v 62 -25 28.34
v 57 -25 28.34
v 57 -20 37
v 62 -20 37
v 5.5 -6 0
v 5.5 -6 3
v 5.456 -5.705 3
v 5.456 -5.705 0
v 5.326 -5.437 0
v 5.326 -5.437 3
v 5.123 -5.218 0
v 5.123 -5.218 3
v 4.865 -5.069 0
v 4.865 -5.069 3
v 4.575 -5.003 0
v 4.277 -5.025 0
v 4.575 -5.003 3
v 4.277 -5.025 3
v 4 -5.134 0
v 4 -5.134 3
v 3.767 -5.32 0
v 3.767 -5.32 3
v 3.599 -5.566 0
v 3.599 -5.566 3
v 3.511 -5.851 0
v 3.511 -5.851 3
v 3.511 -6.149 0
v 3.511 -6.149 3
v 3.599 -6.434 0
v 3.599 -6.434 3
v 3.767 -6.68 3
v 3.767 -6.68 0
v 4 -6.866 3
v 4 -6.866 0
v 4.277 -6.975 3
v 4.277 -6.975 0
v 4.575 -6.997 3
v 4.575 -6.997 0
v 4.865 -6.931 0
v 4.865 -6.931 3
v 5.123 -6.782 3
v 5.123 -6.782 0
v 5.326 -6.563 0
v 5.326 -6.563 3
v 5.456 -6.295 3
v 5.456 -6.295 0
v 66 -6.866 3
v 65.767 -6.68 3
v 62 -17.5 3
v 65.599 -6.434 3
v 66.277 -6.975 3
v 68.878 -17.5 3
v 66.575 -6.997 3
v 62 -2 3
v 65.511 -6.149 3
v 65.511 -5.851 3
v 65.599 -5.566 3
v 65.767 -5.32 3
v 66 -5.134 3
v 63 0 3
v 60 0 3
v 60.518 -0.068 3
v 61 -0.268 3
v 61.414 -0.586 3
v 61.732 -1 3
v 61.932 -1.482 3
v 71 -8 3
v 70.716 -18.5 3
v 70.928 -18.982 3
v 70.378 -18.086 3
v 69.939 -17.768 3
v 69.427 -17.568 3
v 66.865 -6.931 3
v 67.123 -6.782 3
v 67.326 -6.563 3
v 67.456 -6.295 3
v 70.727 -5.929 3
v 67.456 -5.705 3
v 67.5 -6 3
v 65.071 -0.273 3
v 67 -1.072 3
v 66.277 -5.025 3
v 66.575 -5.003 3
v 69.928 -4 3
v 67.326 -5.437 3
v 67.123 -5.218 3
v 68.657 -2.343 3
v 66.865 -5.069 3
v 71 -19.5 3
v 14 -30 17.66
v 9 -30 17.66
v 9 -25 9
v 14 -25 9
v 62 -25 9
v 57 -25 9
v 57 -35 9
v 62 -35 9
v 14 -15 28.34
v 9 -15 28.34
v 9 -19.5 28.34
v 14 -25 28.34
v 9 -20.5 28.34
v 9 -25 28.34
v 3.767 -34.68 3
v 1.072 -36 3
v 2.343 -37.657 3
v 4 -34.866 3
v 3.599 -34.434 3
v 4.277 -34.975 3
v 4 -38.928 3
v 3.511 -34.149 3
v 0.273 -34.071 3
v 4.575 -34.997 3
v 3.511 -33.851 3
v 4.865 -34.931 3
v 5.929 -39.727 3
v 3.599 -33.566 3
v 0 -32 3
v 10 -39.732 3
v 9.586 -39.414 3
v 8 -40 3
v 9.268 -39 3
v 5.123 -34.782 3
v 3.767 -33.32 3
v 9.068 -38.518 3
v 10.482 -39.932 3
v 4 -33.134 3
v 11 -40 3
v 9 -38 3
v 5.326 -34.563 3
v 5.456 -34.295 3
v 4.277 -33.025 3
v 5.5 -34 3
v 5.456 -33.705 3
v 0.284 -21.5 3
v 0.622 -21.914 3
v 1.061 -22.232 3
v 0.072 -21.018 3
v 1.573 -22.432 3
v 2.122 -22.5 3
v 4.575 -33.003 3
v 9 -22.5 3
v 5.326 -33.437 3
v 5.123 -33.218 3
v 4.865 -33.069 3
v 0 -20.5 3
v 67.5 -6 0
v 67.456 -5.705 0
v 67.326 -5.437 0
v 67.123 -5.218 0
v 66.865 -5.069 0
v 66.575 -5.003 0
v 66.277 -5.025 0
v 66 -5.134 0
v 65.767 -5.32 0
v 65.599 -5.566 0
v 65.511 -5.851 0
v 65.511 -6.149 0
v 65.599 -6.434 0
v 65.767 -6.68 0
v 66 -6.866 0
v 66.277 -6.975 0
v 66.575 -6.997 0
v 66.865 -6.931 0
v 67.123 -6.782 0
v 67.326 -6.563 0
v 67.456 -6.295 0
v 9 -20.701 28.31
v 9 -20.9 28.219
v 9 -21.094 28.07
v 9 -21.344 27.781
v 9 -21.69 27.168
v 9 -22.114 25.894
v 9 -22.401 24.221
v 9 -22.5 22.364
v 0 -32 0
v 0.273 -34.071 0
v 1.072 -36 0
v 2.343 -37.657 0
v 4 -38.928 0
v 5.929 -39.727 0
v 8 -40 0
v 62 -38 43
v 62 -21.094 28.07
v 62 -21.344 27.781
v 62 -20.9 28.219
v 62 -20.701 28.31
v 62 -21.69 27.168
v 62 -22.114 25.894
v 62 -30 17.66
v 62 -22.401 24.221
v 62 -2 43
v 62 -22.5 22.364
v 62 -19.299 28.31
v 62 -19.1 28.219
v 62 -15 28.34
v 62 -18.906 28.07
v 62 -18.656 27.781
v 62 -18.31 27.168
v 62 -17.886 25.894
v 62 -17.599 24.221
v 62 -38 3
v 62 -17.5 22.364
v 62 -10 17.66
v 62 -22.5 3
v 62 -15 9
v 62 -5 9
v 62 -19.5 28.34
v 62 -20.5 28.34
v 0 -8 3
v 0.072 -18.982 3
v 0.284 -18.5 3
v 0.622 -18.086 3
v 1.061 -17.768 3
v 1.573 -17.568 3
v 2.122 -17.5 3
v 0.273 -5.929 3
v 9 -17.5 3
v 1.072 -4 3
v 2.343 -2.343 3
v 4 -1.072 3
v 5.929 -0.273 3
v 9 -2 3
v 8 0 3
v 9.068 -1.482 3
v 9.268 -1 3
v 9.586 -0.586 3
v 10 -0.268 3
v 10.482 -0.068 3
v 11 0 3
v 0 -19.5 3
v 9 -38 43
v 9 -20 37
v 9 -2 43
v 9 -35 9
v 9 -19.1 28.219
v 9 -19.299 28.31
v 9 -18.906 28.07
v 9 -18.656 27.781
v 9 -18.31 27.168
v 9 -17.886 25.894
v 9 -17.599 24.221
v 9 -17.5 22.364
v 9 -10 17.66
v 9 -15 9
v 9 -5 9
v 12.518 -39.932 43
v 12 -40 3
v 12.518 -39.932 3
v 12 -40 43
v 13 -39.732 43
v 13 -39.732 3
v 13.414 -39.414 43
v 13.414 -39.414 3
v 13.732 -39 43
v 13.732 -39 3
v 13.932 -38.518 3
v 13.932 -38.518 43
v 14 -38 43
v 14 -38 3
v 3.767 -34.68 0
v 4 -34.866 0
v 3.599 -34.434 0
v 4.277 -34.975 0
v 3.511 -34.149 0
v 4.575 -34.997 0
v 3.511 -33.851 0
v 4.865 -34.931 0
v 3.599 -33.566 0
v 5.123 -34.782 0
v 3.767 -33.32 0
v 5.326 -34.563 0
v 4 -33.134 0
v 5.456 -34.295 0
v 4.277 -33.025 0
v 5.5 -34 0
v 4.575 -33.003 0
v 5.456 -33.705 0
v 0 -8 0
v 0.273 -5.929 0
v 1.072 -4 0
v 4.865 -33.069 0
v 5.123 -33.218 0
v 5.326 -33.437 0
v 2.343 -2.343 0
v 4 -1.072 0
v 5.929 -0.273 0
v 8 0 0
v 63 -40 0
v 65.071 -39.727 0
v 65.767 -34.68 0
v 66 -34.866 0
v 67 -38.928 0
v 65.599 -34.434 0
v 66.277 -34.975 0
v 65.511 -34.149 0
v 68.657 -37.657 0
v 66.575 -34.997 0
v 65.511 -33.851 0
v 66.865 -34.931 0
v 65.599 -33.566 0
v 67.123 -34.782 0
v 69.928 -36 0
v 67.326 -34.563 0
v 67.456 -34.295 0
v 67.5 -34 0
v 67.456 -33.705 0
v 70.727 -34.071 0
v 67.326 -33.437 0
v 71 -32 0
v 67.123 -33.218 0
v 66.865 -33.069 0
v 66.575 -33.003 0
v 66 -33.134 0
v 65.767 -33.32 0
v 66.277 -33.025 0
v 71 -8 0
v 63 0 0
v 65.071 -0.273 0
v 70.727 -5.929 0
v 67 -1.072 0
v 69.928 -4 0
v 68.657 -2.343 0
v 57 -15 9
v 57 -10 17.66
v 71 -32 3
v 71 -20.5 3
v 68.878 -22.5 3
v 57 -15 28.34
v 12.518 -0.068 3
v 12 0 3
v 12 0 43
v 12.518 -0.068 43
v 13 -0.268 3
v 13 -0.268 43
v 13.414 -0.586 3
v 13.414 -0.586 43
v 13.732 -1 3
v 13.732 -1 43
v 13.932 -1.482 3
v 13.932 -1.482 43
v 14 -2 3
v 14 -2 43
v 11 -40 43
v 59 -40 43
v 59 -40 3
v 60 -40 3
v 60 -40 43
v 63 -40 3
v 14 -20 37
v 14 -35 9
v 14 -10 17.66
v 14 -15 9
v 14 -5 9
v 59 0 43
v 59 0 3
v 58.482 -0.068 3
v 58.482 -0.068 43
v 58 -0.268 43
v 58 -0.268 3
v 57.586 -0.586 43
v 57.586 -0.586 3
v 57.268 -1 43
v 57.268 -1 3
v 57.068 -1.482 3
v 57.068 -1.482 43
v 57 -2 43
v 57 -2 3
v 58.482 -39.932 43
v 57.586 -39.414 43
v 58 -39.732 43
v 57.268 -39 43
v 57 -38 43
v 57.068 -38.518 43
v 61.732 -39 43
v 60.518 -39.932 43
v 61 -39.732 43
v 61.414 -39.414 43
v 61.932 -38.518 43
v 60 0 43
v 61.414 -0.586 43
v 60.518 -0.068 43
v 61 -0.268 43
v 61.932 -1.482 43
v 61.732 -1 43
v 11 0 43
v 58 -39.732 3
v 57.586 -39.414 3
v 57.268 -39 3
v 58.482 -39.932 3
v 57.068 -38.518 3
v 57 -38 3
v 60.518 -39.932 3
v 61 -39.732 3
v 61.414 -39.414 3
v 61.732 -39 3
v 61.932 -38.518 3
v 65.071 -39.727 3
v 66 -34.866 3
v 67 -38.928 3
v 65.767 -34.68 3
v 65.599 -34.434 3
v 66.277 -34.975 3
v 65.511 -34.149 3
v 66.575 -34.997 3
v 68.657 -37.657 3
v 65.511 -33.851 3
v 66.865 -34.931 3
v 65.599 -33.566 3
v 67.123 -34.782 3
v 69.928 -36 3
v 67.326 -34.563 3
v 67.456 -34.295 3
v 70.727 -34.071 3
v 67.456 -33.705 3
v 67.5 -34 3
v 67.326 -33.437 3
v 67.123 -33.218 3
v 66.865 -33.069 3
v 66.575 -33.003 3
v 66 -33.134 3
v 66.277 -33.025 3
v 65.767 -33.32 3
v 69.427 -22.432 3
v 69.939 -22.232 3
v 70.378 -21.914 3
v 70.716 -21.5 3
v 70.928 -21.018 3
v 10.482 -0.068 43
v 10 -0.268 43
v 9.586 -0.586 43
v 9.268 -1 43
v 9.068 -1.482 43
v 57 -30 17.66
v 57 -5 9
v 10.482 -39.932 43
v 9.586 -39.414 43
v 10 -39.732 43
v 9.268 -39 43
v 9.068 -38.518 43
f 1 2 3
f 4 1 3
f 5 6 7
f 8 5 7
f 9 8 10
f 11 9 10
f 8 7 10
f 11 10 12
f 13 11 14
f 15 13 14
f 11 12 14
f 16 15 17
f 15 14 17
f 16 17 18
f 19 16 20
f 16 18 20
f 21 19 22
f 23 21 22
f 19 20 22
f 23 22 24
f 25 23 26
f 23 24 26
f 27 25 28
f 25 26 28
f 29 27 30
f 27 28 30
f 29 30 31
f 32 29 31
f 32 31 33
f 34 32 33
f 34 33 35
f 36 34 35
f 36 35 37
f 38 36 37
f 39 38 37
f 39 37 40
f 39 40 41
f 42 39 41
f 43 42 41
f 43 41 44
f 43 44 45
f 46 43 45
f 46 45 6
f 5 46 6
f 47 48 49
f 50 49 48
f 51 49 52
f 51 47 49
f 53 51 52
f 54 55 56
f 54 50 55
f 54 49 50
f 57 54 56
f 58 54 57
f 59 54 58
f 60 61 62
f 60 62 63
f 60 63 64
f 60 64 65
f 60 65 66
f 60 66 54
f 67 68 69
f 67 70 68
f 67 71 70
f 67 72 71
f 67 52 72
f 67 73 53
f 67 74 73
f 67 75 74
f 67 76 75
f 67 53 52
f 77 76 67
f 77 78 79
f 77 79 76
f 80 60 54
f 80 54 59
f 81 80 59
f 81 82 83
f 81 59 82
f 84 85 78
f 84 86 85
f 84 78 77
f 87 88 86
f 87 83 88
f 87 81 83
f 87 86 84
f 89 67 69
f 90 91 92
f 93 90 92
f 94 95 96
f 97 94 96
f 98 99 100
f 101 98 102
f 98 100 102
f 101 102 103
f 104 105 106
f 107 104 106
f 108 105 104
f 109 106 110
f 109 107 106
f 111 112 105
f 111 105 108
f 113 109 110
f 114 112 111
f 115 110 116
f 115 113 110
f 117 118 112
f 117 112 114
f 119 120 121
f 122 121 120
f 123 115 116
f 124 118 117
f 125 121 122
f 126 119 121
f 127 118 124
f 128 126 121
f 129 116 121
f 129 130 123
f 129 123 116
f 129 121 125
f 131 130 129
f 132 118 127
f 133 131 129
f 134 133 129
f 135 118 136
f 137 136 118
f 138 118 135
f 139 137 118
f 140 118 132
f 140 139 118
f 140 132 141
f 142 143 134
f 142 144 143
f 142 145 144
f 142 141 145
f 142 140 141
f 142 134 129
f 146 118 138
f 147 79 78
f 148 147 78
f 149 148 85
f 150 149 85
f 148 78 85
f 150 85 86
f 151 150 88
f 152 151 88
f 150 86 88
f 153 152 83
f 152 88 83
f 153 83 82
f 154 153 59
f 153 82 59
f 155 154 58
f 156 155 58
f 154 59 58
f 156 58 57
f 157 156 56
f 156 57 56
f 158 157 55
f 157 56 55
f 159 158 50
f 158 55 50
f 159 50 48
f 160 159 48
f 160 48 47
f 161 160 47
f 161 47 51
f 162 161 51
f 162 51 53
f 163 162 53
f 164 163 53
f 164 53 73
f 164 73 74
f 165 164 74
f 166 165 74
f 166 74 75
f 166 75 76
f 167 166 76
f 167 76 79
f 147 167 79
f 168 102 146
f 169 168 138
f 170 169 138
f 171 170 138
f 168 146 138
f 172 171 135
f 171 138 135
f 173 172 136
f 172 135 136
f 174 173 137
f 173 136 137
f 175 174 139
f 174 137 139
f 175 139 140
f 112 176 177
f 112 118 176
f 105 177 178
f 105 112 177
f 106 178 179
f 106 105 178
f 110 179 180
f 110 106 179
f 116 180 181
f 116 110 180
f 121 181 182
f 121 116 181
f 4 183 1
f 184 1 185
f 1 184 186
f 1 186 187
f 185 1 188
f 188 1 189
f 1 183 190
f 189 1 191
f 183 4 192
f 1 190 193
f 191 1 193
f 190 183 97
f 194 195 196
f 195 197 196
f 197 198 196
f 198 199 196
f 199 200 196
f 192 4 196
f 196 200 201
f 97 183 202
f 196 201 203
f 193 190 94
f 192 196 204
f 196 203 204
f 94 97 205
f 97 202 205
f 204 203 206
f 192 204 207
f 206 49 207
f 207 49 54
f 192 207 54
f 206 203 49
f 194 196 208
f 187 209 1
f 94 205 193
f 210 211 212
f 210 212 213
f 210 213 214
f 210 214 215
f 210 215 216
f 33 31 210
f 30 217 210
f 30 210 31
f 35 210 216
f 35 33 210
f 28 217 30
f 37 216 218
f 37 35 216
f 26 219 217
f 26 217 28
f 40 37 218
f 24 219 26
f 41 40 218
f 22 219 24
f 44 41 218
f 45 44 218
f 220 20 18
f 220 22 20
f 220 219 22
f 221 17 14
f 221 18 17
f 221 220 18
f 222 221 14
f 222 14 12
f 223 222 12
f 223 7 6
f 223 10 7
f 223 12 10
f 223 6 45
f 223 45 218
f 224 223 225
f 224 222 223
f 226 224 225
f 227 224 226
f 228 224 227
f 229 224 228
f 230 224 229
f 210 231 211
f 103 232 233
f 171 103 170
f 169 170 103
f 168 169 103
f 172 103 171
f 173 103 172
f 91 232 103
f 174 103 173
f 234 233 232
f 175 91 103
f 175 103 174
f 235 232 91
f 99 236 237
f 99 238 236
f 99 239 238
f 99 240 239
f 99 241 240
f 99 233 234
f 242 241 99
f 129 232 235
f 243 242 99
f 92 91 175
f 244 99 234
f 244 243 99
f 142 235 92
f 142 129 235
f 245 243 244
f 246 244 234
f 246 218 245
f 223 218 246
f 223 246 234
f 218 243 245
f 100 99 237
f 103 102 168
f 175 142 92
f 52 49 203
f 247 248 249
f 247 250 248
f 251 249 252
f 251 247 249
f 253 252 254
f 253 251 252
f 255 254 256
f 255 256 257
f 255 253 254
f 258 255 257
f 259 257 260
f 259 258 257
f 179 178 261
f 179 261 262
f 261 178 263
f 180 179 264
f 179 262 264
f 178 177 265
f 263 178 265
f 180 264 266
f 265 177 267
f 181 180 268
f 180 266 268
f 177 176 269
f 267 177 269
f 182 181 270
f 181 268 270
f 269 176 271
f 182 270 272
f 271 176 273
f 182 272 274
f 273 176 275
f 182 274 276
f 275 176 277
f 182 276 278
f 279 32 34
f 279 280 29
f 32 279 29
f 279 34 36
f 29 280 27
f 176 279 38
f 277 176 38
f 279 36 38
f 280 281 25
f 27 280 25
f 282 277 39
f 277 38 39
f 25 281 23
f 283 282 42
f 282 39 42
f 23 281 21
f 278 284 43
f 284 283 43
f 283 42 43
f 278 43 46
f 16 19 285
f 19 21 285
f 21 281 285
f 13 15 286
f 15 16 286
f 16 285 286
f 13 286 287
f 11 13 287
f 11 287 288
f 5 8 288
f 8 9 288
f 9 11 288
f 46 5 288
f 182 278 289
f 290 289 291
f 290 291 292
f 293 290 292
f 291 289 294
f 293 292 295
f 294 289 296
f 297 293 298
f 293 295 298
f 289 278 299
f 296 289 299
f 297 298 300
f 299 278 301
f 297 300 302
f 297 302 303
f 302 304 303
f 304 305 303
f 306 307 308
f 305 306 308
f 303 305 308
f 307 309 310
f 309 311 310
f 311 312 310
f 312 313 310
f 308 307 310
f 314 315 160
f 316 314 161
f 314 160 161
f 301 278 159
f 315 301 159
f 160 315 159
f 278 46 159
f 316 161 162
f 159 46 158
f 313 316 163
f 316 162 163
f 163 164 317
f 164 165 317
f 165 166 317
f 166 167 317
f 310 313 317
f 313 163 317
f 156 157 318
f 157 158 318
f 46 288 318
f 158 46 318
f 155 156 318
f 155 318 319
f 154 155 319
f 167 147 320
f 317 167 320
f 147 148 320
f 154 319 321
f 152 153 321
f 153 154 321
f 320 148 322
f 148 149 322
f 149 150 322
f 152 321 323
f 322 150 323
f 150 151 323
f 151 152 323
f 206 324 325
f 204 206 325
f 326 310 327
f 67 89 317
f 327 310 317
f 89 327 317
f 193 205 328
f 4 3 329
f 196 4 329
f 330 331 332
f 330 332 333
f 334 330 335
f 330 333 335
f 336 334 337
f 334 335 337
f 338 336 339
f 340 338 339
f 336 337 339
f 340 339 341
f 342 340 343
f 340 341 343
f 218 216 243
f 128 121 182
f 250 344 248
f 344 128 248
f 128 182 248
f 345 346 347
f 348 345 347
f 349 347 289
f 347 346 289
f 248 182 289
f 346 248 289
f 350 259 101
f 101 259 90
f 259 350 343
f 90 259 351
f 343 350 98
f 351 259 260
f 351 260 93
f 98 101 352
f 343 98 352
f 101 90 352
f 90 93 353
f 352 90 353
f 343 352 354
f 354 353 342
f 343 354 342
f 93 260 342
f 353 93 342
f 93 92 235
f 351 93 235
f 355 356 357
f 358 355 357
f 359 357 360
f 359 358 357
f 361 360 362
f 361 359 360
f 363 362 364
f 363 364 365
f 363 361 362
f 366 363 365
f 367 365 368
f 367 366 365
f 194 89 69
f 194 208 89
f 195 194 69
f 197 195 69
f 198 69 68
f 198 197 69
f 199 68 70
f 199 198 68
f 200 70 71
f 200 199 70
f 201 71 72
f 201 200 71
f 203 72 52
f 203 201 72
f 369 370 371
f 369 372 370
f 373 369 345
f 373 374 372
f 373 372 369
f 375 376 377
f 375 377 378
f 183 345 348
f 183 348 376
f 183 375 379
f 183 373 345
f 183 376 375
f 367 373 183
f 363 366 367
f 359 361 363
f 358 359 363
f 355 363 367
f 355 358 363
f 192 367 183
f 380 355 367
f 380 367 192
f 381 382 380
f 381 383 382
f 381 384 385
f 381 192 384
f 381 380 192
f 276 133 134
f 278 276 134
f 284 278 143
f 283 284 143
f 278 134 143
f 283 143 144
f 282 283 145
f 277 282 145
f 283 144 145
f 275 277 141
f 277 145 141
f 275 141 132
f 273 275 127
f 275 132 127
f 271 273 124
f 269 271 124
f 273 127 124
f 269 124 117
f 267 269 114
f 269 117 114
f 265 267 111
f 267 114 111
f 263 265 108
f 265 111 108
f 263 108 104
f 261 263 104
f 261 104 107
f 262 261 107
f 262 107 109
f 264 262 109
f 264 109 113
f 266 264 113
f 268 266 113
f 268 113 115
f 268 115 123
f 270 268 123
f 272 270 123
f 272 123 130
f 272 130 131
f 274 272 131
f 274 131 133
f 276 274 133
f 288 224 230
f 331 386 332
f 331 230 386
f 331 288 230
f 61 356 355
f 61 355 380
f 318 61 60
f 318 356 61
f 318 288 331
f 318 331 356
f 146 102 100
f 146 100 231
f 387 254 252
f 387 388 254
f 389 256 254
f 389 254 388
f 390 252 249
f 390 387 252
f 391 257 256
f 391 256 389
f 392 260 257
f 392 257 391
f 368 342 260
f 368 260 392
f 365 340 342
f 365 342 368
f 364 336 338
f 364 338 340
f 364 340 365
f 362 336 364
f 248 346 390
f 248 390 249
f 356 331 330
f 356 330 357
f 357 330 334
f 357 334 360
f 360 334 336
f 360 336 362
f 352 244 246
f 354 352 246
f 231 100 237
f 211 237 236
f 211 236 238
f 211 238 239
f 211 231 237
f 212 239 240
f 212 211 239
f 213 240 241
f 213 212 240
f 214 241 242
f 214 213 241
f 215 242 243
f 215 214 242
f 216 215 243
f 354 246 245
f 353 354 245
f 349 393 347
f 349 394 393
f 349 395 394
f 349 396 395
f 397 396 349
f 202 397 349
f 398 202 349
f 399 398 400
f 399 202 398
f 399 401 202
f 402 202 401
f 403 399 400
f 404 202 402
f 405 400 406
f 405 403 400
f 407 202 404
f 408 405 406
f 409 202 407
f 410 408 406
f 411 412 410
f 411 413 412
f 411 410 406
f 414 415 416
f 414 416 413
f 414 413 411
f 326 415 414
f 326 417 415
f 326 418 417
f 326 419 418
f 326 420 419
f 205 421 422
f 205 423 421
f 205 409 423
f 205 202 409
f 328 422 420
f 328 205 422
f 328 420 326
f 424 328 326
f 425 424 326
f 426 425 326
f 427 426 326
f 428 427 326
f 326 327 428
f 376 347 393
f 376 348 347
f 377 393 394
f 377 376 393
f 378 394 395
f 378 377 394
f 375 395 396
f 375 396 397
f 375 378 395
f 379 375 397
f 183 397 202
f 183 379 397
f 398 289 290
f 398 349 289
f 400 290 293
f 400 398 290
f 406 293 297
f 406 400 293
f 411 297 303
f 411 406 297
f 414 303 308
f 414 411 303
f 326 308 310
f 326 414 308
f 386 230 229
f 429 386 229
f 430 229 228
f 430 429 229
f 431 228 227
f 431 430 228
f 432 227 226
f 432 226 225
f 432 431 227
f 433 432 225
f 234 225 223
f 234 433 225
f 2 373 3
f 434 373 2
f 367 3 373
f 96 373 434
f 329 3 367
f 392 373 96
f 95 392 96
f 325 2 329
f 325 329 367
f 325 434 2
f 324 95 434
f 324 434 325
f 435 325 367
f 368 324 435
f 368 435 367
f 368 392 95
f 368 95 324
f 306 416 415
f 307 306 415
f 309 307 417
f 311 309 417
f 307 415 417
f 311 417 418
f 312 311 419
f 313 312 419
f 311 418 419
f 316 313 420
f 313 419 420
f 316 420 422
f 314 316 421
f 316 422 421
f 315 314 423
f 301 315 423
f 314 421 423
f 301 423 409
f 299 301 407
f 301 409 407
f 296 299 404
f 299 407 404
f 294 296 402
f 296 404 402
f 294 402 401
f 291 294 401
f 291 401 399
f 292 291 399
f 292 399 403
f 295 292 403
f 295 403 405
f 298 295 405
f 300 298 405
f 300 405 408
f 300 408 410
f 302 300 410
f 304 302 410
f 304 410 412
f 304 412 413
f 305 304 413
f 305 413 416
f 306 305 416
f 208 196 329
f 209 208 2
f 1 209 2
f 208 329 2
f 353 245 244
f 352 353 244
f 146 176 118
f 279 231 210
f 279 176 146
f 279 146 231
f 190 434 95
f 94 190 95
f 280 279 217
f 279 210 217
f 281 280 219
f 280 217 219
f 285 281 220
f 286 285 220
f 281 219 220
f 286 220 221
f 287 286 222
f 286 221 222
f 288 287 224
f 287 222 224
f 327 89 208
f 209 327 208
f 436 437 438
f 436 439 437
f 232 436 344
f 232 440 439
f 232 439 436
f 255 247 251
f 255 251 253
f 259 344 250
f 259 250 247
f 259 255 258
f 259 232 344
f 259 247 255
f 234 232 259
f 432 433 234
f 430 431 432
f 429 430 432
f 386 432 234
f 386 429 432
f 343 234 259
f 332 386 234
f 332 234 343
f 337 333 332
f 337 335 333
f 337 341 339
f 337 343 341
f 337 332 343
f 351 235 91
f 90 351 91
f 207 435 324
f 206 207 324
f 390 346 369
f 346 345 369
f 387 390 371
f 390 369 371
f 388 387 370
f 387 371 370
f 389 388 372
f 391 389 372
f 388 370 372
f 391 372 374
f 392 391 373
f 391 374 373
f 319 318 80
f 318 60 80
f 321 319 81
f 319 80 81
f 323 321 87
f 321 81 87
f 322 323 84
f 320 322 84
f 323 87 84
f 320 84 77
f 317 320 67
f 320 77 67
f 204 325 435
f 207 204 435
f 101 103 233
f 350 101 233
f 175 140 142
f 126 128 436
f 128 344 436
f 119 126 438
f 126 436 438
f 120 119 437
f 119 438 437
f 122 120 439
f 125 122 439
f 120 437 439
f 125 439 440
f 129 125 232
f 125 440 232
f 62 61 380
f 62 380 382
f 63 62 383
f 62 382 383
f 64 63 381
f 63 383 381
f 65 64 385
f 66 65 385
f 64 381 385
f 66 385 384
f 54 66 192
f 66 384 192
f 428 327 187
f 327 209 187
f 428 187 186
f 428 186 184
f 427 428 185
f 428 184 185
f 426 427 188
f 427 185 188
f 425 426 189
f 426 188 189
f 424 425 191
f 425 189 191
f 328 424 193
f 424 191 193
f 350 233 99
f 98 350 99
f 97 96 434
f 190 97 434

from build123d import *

# Parameters (mm, degrees)
F0_W      = 71
F0_H      = 40
F1_DEPTH  = 3
F2_W      = 5
F2_H      = 40
F3_DEPTH  = 40
F4_R      = 1
F5_DEPTH  = 3.001
F7_DEPTH  = 62.001
F13_DEPTH = 2.5
F14_R     = 8
F15_R     = 2


with BuildPart() as f1:
    # F0 (on Top) → F1 (new body)
    with BuildSketch(Plane.XY):
        with Locations((35.5, -20)):
            Rectangle(F0_W, F0_H)
    extrude(amount=F1_DEPTH)

    # F2 (on face) → F3 (join)
    with BuildSketch(Plane.XY.offset(3)):
        with Locations((11.5, -20)):
            Rectangle(F2_W, F2_H)
        with Locations((59.5, -20)):
            Rectangle(F2_W, F2_H)
    extrude(amount=F3_DEPTH)

    # F4 (on face) → F5 (cut, through all)
    with BuildSketch(Plane.XY.offset(3)):
        with Locations((4.5, -6)):
            Circle(F4_R)
        with Locations((4.5, -34)):
            Circle(F4_R)
        with Locations((66.5, -6)):
            Circle(F4_R)
        with Locations((66.5, -34)):
            Circle(F4_R)
    extrude(amount=-F5_DEPTH, mode=Mode.SUBTRACT)

    # F6 (on face) → F7 (cut, through all)
    with BuildSketch(Plane(origin=(9, 0, 0), x_dir=(0, -1, 0), z_dir=(-1, 0, 0))):
        Polygon((10, 17.6602540378), (5, 9), (15, 9), align=None)
        Polygon((25, 28.3397459622), (20, 37), (15, 28.3397459622), align=None)
        Polygon((35, 9), (30, 17.6602540378), (25, 9), align=None)
    extrude(amount=-F7_DEPTH, mode=Mode.SUBTRACT)

    # F12 (on 3pt) → F13 (join, symmetric)
    with BuildSketch(Plane.XZ.offset(20)):
        Polygon((62, 28.3397459622), (62, 3), (71, 3), align=None)
        Polygon((0, 3), (9, 3), (9, 28.3397459622), align=None)
    extrude(amount=F13_DEPTH, both=True)

    # F14
    f14_edges = [f1.edges().sort_by_distance(p)[0] for p in [
        (71, 0, 1.5),
        (0, 0, 1.5),
        (71, -40, 1.5),
        (0, -40, 1.5),
    ]]
    fillet(f14_edges, radius=F14_R)

    # F15
    f15_edges = [f1.edges().sort_by_distance(p)[0] for p in [
        (9, -40, 23),
        (9, 0, 23),
        (62, -40, 23),
        (62, 0, 23),
        (4.5, -17.5, 15.669873),
        (4.5, -22.5, 15.669873),
        (66.5, -17.5, 15.669873),
        (66.5, -22.5, 15.669873),
        (57, 0, 23),
        (14, 0, 23),
        (57, -40, 23),
        (14, -40, 23),
    ]]
    fillet(f15_edges, radius=F15_R)


solid = f1.part
